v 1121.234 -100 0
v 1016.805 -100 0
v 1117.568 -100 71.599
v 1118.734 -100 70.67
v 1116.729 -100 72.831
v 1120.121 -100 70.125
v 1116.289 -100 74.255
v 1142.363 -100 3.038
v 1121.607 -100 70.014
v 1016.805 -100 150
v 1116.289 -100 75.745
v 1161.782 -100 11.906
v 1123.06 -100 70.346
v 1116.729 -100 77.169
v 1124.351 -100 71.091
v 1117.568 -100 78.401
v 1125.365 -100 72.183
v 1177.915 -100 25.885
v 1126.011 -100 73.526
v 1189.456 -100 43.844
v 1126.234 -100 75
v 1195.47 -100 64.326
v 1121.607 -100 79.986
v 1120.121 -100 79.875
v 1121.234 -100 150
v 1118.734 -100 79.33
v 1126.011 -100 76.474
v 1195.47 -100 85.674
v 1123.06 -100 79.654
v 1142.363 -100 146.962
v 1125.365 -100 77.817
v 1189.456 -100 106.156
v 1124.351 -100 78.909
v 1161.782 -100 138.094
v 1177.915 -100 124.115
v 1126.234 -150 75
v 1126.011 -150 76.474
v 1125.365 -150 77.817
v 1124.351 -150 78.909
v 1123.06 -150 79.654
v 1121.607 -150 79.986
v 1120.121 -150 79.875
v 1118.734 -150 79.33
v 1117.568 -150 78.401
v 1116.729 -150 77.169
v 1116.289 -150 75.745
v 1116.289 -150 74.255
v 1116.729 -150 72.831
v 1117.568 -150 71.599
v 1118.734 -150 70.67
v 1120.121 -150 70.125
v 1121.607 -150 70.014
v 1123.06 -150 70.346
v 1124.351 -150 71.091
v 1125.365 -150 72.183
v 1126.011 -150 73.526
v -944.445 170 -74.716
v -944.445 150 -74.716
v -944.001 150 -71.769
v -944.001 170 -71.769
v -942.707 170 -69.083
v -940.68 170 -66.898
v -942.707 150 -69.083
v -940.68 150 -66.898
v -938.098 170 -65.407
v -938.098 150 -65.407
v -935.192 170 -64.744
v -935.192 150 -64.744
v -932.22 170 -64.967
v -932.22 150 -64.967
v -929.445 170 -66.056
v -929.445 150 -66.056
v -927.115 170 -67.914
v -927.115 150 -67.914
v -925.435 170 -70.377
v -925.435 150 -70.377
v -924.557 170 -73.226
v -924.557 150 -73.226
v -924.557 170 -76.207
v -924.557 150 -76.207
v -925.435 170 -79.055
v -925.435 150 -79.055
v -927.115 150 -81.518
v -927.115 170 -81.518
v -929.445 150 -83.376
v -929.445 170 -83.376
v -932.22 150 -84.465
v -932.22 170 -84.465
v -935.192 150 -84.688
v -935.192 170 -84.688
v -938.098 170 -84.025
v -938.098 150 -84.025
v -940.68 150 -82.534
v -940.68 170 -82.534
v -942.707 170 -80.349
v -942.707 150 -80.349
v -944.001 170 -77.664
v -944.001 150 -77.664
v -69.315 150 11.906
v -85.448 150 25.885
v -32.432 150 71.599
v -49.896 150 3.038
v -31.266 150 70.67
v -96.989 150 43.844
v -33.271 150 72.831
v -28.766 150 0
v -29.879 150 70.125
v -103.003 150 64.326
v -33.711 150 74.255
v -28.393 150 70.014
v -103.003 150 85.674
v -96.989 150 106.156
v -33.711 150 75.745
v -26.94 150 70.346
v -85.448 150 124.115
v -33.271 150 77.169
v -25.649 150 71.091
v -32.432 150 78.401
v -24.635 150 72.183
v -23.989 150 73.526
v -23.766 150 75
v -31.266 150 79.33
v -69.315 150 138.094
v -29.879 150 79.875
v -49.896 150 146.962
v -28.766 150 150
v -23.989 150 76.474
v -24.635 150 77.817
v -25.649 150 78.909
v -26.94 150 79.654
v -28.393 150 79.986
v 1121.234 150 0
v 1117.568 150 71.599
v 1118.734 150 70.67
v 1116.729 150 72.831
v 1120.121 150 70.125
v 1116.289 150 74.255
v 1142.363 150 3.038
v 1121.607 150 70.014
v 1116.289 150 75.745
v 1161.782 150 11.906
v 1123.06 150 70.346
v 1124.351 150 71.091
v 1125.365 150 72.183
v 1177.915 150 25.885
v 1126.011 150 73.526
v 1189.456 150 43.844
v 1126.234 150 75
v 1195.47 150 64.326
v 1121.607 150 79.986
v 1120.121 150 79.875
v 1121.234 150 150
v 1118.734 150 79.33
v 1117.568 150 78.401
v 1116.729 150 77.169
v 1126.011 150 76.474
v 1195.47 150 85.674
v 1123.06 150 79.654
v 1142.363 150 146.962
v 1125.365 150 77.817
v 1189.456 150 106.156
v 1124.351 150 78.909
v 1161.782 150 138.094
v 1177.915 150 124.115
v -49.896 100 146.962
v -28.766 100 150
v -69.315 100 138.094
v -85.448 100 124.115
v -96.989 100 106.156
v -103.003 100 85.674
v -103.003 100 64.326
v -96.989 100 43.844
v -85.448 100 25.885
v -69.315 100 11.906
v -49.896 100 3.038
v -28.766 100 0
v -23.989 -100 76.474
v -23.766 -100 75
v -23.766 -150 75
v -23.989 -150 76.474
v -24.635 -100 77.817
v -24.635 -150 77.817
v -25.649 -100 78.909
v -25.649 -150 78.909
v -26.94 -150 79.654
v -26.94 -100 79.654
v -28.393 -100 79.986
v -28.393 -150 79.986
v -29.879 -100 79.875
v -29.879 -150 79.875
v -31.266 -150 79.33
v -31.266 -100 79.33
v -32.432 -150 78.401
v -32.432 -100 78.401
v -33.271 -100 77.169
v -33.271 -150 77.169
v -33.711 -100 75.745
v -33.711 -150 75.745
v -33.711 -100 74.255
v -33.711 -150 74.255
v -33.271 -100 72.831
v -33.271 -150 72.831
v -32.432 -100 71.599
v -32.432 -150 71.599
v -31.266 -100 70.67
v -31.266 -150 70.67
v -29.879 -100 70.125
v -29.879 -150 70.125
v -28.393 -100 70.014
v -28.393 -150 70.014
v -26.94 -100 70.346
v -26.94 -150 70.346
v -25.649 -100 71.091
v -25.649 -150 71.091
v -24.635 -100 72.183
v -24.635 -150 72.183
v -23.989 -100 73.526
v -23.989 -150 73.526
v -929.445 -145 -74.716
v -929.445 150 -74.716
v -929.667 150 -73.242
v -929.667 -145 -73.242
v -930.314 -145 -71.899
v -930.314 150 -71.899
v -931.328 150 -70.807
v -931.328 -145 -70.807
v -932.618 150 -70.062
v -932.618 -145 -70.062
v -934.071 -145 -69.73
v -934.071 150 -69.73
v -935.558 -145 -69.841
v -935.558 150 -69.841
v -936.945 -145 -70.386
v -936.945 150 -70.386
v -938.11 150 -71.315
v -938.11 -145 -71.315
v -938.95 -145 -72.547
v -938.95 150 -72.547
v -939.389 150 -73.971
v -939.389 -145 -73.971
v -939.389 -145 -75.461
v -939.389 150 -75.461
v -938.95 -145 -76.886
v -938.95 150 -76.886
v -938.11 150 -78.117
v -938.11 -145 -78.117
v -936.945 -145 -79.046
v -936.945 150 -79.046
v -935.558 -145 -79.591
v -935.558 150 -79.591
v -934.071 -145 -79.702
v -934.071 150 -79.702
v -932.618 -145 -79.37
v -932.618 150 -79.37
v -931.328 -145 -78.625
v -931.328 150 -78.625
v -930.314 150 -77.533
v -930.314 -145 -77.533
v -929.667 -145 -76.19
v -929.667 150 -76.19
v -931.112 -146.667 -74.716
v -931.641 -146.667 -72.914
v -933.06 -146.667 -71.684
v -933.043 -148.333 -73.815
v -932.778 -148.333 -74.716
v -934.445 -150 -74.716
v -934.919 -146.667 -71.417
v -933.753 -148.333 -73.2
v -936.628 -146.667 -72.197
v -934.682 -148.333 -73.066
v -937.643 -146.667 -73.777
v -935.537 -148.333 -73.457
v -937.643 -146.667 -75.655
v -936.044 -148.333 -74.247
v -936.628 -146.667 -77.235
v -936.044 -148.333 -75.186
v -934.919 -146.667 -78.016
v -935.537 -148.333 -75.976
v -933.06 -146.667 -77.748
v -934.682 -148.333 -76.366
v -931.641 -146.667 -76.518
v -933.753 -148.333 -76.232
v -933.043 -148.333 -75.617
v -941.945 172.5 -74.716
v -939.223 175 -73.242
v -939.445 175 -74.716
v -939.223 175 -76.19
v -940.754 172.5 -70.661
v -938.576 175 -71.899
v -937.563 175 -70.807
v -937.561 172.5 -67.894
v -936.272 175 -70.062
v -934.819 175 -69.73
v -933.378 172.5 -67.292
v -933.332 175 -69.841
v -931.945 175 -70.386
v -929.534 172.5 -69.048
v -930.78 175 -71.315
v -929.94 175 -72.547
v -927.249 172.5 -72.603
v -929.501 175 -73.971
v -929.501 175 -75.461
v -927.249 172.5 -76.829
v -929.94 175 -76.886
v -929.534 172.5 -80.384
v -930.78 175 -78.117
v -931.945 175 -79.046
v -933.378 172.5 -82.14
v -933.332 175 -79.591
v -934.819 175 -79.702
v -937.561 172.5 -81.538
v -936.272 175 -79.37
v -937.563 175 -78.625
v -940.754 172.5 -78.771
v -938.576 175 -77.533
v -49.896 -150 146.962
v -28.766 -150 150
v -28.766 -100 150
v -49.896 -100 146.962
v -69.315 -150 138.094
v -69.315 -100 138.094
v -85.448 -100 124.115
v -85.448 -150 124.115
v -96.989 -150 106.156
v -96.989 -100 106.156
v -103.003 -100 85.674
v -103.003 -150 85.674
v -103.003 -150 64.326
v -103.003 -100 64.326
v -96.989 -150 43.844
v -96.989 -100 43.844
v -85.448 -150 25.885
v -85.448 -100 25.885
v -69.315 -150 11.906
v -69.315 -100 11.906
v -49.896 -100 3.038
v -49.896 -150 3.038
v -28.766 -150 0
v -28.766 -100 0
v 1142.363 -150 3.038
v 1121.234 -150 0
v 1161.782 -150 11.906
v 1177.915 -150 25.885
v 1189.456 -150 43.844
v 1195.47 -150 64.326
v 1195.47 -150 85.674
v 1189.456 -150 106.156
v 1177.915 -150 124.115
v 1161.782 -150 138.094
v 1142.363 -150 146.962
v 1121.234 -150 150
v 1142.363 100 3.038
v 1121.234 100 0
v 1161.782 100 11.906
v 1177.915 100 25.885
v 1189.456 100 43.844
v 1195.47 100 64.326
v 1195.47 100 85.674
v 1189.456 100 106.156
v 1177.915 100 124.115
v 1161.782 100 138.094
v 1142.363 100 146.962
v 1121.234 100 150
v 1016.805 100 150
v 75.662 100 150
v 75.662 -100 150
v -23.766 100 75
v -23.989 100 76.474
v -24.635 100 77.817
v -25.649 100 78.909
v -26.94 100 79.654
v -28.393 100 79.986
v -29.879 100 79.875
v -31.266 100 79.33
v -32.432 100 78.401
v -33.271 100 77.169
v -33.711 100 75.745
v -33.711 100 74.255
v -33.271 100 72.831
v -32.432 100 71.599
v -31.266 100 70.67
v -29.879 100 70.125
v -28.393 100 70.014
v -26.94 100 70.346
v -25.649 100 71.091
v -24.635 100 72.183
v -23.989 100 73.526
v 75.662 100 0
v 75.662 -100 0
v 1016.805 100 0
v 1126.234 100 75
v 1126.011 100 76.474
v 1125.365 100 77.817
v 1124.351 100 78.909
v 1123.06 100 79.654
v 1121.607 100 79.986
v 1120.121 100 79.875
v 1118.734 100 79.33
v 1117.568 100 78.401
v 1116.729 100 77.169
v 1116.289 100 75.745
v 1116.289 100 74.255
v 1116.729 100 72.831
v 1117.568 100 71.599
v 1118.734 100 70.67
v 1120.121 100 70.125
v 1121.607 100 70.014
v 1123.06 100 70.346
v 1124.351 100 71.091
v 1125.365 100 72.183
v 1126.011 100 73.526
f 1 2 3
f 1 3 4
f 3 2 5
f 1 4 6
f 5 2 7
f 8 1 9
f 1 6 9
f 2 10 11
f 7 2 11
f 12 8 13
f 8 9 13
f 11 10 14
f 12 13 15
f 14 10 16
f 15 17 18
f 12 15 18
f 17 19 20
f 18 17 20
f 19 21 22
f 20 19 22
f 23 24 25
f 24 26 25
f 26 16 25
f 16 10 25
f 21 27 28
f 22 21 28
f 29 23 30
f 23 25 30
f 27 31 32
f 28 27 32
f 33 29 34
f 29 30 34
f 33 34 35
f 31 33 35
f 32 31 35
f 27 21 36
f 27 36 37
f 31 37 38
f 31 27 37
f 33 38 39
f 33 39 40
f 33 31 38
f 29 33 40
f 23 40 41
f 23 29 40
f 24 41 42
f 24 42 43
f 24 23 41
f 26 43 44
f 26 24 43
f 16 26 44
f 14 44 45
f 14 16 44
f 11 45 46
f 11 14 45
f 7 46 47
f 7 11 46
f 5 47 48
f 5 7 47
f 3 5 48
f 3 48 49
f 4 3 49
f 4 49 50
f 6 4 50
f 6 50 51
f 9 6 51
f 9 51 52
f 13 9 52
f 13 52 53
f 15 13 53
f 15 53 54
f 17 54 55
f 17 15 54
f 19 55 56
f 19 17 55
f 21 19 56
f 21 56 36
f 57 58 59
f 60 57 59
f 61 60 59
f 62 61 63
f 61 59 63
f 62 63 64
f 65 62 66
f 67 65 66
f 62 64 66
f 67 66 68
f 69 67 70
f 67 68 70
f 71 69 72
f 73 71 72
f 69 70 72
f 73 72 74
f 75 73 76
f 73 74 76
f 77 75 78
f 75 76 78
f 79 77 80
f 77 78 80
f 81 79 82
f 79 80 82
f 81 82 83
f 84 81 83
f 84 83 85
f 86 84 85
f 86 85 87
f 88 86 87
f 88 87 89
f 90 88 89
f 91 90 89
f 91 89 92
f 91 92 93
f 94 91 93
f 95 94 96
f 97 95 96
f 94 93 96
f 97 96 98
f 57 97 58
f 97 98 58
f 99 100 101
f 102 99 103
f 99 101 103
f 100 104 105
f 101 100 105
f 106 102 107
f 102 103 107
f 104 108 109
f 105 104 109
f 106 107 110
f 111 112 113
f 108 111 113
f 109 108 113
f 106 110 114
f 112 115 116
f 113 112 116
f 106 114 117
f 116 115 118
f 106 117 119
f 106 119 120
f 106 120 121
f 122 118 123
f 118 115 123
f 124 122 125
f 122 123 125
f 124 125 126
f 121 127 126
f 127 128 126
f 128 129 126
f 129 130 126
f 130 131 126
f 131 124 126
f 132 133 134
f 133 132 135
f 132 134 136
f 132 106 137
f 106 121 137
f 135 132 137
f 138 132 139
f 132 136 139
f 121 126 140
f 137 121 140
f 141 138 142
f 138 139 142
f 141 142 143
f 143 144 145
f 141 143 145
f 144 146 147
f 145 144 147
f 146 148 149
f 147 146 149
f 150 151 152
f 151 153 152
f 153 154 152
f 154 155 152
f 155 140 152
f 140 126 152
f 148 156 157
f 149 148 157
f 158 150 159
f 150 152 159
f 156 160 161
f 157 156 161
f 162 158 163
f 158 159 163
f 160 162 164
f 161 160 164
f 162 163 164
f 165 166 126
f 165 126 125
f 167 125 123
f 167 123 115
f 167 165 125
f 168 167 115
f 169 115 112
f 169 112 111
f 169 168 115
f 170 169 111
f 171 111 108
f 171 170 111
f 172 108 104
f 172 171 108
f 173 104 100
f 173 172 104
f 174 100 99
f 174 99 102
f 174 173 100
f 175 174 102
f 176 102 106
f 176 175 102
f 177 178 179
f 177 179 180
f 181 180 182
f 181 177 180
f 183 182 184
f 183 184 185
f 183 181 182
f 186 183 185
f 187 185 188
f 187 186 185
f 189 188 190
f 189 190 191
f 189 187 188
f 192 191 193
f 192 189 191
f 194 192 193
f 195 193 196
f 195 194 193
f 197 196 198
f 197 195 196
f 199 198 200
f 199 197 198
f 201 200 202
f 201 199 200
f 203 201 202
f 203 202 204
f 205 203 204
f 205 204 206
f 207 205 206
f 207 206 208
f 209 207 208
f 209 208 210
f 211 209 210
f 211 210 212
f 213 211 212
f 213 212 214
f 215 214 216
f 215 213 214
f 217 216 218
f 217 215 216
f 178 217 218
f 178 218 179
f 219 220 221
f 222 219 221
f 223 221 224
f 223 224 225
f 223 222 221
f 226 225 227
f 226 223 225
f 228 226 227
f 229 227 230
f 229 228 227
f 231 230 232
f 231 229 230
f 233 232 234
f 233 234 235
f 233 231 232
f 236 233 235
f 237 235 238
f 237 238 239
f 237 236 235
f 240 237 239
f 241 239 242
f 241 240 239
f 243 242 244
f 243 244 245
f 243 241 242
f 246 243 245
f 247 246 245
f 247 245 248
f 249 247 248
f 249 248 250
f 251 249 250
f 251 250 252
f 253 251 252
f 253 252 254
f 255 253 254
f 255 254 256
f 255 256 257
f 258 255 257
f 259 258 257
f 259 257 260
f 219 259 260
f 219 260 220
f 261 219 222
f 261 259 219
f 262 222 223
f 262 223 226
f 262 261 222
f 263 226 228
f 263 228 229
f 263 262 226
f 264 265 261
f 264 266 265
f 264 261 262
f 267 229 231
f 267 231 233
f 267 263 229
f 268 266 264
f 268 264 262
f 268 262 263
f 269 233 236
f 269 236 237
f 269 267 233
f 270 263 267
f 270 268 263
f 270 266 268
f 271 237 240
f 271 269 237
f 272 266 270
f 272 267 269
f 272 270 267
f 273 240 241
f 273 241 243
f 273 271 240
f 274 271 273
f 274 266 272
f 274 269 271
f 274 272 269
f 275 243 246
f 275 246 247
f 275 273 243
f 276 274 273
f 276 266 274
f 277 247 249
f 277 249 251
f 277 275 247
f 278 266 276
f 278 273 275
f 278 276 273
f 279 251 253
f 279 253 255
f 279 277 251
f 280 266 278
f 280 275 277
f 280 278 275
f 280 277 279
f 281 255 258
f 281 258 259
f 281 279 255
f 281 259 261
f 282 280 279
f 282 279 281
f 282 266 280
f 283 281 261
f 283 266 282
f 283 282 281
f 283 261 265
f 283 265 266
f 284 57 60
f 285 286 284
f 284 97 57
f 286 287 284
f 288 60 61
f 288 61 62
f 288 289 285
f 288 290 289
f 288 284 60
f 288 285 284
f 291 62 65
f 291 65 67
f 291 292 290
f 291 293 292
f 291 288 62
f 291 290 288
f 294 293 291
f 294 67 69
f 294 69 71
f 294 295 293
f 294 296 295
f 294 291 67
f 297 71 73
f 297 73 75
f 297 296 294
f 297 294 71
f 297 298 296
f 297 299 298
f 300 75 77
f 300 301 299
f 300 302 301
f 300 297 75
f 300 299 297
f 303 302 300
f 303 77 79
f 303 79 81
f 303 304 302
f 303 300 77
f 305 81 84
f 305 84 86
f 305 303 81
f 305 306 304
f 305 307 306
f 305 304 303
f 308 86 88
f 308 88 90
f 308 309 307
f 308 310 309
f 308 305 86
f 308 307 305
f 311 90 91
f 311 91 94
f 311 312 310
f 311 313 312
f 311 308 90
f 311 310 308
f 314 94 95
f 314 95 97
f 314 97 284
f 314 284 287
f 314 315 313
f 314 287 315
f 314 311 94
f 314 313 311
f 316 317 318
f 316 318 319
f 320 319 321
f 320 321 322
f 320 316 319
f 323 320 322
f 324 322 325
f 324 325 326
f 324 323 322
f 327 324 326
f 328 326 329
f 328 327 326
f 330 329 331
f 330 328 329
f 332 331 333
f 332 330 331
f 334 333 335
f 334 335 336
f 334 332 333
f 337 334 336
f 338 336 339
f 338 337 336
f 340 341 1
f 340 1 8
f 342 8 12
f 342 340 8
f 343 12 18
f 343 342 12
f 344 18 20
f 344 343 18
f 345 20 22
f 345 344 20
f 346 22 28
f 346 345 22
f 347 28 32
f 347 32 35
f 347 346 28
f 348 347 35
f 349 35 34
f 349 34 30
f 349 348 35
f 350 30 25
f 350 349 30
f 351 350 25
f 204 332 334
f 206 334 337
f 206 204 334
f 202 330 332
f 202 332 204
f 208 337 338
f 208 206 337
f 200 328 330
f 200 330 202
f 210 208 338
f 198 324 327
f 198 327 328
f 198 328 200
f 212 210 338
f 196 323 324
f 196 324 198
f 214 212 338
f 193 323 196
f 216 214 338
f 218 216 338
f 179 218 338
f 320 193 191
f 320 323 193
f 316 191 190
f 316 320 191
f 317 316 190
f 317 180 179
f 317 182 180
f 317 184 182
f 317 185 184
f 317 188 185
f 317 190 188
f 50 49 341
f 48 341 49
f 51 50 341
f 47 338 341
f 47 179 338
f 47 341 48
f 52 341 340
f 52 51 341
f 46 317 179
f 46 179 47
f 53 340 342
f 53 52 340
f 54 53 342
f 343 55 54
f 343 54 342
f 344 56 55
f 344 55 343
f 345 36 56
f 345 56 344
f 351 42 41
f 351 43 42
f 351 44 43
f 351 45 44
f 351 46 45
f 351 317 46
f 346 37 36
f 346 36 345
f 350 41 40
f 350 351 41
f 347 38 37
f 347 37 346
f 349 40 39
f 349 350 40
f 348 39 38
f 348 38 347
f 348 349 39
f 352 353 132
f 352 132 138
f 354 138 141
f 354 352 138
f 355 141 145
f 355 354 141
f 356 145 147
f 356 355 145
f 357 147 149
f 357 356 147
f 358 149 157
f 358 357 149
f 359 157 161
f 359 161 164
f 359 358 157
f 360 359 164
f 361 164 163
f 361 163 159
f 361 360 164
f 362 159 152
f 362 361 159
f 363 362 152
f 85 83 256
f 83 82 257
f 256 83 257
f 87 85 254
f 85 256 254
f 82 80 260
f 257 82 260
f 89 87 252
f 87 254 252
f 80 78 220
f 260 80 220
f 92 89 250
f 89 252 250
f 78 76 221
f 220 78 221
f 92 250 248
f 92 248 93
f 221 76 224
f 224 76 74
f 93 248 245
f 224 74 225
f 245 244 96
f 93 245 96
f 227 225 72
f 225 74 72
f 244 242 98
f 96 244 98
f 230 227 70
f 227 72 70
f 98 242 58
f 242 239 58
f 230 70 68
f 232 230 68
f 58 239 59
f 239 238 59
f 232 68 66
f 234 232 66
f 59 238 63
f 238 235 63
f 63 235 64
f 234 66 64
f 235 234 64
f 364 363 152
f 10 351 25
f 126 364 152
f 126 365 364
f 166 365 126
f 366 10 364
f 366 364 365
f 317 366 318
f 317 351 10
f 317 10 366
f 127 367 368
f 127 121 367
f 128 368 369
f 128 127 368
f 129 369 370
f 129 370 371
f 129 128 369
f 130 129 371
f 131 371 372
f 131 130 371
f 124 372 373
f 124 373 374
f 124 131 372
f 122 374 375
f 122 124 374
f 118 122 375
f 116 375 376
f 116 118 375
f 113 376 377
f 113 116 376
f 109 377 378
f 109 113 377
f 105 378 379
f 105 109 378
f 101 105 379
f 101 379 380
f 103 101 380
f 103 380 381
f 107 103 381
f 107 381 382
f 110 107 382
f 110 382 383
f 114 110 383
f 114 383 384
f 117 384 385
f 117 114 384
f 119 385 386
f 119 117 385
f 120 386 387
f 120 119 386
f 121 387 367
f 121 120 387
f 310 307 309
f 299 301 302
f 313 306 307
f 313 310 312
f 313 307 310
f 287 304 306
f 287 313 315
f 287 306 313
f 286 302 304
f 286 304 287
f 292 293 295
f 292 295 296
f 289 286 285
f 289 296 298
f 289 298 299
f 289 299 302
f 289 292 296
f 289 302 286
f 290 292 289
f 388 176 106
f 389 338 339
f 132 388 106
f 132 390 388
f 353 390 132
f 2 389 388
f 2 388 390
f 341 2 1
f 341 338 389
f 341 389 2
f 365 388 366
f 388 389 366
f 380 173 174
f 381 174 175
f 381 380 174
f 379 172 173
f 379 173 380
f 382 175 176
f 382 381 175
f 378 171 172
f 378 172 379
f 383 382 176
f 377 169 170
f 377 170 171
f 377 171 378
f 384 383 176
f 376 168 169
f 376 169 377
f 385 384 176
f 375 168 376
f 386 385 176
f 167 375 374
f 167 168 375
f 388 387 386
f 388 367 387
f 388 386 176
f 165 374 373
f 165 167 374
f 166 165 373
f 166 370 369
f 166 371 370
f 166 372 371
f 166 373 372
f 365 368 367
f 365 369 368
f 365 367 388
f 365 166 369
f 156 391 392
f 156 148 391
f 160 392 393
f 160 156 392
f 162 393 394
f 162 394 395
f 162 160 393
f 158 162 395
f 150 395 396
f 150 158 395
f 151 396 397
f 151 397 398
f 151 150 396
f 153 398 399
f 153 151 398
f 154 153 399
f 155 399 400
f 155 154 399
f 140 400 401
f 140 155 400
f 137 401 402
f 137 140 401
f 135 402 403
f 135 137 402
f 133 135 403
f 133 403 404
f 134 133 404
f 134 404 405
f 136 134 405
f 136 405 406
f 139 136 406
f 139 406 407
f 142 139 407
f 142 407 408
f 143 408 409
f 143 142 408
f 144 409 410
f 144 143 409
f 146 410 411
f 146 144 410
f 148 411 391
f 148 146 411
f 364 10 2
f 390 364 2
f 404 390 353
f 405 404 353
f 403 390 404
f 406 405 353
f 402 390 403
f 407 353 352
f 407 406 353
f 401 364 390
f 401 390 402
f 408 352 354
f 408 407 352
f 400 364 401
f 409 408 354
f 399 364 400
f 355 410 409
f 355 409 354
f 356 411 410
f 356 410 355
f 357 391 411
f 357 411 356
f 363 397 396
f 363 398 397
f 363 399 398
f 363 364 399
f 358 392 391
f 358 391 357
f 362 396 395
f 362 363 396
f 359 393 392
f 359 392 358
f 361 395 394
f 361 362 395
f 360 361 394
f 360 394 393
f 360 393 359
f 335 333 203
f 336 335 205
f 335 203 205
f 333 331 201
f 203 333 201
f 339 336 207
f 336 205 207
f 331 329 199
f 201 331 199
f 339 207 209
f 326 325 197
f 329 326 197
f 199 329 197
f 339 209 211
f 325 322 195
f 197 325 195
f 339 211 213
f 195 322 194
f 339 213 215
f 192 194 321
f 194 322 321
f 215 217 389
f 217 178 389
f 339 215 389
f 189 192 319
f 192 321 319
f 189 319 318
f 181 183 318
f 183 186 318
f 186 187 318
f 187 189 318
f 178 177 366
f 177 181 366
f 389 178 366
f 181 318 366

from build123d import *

# Parameters (mm, degrees)
F0_W      = 470.5713823438
F0_H      = 150
F1_DEPTH  = 150
F2_DEPTH  = 150
F0_R      = 5
F3_DEPTH  = 150
F4_DEPTH  = 100
F5_DEPTH  = 150
F6_DEPTH  = 100
F7_R      = 5
F8_DEPTH  = 150
F9_SIZE   = 5
F10_R     = 10
F11_DEPTH = 25
F12_SIZE  = 5


with BuildPart() as f1:
    # F0 (on Front) → F1 (new body)
    with BuildSketch(Plane.XZ):
        with Locations((781.5192423761, 75)):
            Rectangle(F0_W, F0_H)
        with Locations((310.9478600323, 75)):
            Rectangle(F0_W, F0_H)
    extrude(amount=F1_DEPTH)

    # F2 (add): a face of the model
    f2_faces = [f1.faces().sort_by_distance(p)[0] for p in [
        (546.2335512042, 0, 75),
    ]]
    extrude(f2_faces, amount=F2_DEPTH)

    # F0 (on Front) → F3 (join, symmetric)
    with BuildSketch(Plane.XZ):
        with BuildLine():
            Line((75.6621688604, 150), (-28.7664487958, 150))
            ThreePointArc((-28.7664487958, 150), (-81.7994573848, 128.033008589), (-103.7664487958, 75))
            ThreePointArc((-103.7664487958, 75), (-81.7994573848, 21.966991411), (-28.7664487958, 0))
            Line((-28.7664487958, 0), (75.6621688604, 0))
            Line((75.6621688604, 0), (75.6621688604, 150))
        make_face()
        with Locations((-28.7664487958, 75)):
            Circle(F0_R, mode=Mode.SUBTRACT)
    extrude(amount=F3_DEPTH, both=True)

    # F0 (on Front) → F4 (cut, symmetric)
    with BuildSketch(Plane.XZ):
        with BuildLine():
            Line((75.6621688604, 150), (-28.7664487958, 150))
            ThreePointArc((-28.7664487958, 150), (-81.7994573848, 128.033008589), (-103.7664487958, 75))
            ThreePointArc((-103.7664487958, 75), (-81.7994573848, 21.966991411), (-28.7664487958, 0))
            Line((-28.7664487958, 0), (75.6621688604, 0))
            Line((75.6621688604, 0), (75.6621688604, 150))
        make_face()
        with Locations((-28.7664487958, 75)):
            Circle(F0_R, mode=Mode.SUBTRACT)
    extrude(amount=F4_DEPTH, both=True, mode=Mode.SUBTRACT)

    # F0 (on Front) → F5 (join, symmetric)
    with BuildSketch(Plane.XZ):
        with BuildLine():
            Line((1121.2335512042, 150), (1016.804933548, 150))
            Line((1016.804933548, 150), (1016.804933548, 0))
            Line((1016.804933548, 0), (1121.2335512042, 0))
            ThreePointArc((1121.2335512042, 0), (1174.2665597932, 21.966991411), (1196.2335512042, 75))
            ThreePointArc((1196.2335512042, 75), (1174.2665597932, 128.033008589), (1121.2335512042, 150))
        make_face()
        with Locations((1121.2335512042, 75)):
            Circle(F0_R, mode=Mode.SUBTRACT)
    extrude(amount=F5_DEPTH, both=True)

    # F0 (on Front) → F6 (cut, symmetric)
    with BuildSketch(Plane.XZ):
        with BuildLine():
            Line((1121.2335512042, 150), (1016.804933548, 150))
            Line((1016.804933548, 150), (1016.804933548, 0))
            Line((1016.804933548, 0), (1121.2335512042, 0))
            ThreePointArc((1121.2335512042, 0), (1174.2665597932, 21.966991411), (1196.2335512042, 75))
            ThreePointArc((1196.2335512042, 75), (1174.2665597932, 128.033008589), (1121.2335512042, 150))
        make_face()
        with Locations((1121.2335512042, 75)):
            Circle(F0_R, mode=Mode.SUBTRACT)
    extrude(amount=F6_DEPTH, both=True, mode=Mode.SUBTRACT)


with BuildPart() as f8:
    # F7 (on Front) → F8 (new body, symmetric)
    with BuildSketch(Plane.XZ):
        with Locations((-934.4450831413, -74.7160986066)):
            Circle(F7_R)
    extrude(amount=F8_DEPTH, both=True)

    # F9
    f9_edges = [f8.edges().sort_by_distance(p)[0] for p in [
        (-939.445083, -150, -74.716099),
    ]]
    chamfer(f9_edges, length=F9_SIZE)

    # F10 (on face) → F11 (join)
    with BuildSketch(Plane(origin=(0, 150, 0), x_dir=(-1, 0, 0), z_dir=(0, 1, 0))):
        with Locations((934.4450831413, -74.7160986066)):
            Circle(F10_R)
    extrude(amount=F11_DEPTH)

    # F12
    f12_edges = [f8.edges().sort_by_distance(p)[0] for p in [
        (-924.445083, 175, -74.716099),
    ]]
    chamfer(f12_edges, length=F12_SIZE)


solid = Compound([f1.part, f8.part])
